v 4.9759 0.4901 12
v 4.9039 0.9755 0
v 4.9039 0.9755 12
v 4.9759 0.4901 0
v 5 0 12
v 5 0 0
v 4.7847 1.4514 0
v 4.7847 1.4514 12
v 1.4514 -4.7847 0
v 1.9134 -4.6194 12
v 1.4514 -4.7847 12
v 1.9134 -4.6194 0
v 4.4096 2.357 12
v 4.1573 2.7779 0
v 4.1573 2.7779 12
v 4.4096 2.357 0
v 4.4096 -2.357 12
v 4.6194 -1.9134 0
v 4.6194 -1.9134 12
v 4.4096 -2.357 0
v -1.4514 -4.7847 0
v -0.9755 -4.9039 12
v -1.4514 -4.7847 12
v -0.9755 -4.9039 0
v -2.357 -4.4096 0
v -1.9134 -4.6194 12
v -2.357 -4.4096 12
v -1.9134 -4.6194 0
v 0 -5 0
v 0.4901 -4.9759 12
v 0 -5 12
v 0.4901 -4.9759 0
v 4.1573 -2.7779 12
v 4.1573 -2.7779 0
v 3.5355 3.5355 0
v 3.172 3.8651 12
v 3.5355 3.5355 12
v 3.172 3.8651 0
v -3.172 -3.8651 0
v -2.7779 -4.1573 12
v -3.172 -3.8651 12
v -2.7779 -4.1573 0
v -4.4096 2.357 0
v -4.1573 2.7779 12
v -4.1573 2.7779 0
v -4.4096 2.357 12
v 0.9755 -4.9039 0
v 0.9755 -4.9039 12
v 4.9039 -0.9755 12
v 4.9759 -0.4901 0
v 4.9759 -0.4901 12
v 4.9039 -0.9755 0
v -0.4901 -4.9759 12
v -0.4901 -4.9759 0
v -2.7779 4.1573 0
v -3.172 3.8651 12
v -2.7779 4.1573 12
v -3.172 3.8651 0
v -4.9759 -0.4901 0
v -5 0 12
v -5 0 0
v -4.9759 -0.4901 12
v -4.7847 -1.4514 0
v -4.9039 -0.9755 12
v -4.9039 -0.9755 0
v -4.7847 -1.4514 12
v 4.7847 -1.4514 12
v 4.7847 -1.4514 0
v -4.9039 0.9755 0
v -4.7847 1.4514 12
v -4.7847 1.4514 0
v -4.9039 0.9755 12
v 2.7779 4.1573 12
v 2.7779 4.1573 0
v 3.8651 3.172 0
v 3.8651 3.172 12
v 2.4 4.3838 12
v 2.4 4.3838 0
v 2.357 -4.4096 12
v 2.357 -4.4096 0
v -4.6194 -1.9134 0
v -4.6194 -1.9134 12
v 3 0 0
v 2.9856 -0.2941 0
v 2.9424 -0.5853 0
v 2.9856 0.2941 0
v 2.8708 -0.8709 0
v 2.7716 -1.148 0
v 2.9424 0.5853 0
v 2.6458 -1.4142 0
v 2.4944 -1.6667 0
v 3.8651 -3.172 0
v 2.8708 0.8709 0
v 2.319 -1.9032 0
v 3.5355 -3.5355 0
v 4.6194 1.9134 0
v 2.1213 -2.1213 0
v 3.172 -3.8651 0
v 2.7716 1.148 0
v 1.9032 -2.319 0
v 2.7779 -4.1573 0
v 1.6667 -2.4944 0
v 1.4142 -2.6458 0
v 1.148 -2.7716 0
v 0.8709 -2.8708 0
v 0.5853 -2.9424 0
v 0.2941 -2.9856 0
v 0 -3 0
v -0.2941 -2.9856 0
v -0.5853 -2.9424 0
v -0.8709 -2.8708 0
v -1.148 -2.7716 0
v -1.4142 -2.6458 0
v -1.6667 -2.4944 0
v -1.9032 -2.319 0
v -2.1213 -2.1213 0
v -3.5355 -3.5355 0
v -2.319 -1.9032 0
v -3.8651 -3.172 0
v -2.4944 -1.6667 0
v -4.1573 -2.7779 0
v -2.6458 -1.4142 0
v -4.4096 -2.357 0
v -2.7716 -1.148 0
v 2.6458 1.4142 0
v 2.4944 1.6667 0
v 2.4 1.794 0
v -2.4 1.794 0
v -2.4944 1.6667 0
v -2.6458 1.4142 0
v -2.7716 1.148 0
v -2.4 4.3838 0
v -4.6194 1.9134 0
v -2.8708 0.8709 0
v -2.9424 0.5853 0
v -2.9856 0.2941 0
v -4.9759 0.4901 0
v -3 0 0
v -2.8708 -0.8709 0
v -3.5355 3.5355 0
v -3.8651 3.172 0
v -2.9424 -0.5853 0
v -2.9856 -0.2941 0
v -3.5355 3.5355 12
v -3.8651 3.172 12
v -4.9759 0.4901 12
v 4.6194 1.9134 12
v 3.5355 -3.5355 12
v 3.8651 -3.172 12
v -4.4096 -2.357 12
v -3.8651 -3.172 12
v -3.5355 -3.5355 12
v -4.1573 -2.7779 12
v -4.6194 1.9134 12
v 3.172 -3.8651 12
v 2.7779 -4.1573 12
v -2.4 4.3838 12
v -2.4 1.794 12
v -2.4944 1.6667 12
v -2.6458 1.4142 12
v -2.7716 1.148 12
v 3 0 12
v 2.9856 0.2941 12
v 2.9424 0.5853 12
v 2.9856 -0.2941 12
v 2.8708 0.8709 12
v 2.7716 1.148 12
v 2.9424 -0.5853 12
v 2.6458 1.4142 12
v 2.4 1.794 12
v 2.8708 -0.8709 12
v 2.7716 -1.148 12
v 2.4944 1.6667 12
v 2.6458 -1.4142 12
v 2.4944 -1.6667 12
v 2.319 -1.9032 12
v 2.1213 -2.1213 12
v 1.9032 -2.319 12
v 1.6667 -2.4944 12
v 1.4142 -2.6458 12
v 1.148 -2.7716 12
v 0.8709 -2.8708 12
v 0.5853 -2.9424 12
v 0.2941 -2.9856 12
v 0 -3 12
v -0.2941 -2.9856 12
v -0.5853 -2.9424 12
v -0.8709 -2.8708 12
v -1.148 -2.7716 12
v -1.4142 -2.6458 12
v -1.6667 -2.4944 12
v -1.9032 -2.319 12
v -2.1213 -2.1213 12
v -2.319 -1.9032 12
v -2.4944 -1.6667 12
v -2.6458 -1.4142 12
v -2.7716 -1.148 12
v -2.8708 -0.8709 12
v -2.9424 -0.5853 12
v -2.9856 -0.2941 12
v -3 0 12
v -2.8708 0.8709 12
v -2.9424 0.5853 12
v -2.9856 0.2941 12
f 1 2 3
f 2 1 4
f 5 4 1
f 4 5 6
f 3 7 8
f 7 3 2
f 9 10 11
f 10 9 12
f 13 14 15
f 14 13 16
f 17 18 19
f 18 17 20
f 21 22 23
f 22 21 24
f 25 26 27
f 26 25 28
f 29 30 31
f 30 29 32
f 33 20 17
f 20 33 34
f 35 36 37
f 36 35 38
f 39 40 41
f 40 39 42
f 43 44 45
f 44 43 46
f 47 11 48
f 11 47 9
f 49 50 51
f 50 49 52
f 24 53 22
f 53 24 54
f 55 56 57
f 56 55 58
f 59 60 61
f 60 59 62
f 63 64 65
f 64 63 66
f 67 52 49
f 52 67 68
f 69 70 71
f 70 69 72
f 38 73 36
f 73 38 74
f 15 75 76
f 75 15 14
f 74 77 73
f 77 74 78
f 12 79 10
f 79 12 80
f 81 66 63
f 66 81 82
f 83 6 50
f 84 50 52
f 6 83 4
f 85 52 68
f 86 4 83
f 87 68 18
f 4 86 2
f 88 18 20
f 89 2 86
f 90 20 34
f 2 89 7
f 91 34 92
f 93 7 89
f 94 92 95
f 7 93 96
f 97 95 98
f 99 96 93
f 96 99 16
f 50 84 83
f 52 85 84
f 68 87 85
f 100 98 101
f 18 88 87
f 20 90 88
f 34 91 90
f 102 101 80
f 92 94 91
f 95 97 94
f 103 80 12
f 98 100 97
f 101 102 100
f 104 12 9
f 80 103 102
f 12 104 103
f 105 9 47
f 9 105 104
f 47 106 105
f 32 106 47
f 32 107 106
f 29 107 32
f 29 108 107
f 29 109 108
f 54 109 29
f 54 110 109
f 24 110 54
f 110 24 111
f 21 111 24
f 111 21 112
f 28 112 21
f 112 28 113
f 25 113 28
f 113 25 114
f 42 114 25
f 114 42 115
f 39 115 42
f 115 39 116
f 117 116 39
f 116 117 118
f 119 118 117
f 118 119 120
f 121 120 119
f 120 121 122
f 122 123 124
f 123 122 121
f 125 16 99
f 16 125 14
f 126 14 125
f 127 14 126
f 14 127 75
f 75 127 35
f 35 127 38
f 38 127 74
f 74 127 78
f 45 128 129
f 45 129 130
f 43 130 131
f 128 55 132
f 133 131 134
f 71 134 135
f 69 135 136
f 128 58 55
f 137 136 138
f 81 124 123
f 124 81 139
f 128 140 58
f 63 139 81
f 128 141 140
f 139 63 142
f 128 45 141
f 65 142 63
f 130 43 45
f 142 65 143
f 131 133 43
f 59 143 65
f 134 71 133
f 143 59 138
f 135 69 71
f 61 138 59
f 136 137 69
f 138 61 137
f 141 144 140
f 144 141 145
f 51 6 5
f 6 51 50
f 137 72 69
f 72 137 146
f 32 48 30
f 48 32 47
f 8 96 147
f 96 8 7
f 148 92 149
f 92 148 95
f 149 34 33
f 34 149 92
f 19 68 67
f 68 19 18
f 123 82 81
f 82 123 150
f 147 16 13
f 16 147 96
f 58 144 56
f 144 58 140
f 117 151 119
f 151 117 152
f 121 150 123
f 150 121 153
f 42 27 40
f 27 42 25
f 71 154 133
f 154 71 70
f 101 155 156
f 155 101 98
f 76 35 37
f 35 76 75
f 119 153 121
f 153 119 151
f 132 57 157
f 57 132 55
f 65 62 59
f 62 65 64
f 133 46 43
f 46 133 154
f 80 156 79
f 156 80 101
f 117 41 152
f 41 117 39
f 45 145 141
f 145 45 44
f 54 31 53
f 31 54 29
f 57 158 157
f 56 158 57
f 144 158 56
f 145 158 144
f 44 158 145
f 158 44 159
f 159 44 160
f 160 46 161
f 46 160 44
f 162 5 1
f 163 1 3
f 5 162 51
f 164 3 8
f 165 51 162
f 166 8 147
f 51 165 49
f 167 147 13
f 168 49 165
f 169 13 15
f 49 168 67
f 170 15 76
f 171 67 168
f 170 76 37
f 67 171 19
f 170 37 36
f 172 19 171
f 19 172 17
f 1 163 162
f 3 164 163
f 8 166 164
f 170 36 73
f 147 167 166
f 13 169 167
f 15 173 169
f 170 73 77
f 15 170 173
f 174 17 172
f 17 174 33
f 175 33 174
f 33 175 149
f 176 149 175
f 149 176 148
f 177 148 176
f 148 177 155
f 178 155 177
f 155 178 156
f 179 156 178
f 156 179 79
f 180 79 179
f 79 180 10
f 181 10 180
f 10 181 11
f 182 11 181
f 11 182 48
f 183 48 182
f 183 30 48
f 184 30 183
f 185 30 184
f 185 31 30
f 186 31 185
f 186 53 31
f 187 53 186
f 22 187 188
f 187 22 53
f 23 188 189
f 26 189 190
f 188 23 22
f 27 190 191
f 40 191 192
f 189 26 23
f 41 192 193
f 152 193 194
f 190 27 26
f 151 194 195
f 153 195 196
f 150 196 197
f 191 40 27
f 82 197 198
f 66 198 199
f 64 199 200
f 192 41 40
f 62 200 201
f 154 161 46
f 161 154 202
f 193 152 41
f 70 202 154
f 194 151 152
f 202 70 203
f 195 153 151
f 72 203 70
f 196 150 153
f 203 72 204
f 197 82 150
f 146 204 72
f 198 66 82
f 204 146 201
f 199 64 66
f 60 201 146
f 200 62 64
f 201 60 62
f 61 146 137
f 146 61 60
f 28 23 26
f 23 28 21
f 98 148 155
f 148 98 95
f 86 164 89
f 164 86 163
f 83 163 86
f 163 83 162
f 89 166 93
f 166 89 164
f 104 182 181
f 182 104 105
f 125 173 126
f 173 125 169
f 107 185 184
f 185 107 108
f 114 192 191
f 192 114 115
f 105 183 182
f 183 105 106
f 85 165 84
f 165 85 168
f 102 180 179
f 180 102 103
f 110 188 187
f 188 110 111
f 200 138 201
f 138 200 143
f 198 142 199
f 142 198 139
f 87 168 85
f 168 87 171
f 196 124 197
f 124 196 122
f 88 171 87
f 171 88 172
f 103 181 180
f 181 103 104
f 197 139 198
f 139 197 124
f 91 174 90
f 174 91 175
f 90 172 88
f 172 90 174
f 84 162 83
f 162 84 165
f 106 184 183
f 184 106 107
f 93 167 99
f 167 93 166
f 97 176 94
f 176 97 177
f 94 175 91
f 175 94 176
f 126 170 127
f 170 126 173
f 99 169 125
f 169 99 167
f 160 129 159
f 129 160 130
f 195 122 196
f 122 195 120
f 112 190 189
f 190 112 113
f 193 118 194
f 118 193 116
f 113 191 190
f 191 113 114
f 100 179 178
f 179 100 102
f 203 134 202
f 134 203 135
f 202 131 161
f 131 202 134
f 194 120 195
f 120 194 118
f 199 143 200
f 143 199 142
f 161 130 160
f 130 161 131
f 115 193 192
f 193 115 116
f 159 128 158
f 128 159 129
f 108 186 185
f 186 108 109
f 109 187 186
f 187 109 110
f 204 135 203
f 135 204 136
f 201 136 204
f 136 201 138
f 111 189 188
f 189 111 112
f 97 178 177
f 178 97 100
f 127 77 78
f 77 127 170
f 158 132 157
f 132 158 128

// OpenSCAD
// cable-clip.scad — snap clip, hardcoded-ish; cable_d is the key knob
cable_d = 6;
wall = 2;
depth = 12;
$fn = 64;
eps = 0.01;
opening = cable_d * 0.8;
difference() {
  cylinder(h = depth, d = cable_d + 2 * wall);
  translate([0,0,-eps]) cylinder(h = depth + 2*eps, d = cable_d);
  translate([-opening/2, 0, -eps]) cube([opening, cable_d, depth + 2*eps]);
}
